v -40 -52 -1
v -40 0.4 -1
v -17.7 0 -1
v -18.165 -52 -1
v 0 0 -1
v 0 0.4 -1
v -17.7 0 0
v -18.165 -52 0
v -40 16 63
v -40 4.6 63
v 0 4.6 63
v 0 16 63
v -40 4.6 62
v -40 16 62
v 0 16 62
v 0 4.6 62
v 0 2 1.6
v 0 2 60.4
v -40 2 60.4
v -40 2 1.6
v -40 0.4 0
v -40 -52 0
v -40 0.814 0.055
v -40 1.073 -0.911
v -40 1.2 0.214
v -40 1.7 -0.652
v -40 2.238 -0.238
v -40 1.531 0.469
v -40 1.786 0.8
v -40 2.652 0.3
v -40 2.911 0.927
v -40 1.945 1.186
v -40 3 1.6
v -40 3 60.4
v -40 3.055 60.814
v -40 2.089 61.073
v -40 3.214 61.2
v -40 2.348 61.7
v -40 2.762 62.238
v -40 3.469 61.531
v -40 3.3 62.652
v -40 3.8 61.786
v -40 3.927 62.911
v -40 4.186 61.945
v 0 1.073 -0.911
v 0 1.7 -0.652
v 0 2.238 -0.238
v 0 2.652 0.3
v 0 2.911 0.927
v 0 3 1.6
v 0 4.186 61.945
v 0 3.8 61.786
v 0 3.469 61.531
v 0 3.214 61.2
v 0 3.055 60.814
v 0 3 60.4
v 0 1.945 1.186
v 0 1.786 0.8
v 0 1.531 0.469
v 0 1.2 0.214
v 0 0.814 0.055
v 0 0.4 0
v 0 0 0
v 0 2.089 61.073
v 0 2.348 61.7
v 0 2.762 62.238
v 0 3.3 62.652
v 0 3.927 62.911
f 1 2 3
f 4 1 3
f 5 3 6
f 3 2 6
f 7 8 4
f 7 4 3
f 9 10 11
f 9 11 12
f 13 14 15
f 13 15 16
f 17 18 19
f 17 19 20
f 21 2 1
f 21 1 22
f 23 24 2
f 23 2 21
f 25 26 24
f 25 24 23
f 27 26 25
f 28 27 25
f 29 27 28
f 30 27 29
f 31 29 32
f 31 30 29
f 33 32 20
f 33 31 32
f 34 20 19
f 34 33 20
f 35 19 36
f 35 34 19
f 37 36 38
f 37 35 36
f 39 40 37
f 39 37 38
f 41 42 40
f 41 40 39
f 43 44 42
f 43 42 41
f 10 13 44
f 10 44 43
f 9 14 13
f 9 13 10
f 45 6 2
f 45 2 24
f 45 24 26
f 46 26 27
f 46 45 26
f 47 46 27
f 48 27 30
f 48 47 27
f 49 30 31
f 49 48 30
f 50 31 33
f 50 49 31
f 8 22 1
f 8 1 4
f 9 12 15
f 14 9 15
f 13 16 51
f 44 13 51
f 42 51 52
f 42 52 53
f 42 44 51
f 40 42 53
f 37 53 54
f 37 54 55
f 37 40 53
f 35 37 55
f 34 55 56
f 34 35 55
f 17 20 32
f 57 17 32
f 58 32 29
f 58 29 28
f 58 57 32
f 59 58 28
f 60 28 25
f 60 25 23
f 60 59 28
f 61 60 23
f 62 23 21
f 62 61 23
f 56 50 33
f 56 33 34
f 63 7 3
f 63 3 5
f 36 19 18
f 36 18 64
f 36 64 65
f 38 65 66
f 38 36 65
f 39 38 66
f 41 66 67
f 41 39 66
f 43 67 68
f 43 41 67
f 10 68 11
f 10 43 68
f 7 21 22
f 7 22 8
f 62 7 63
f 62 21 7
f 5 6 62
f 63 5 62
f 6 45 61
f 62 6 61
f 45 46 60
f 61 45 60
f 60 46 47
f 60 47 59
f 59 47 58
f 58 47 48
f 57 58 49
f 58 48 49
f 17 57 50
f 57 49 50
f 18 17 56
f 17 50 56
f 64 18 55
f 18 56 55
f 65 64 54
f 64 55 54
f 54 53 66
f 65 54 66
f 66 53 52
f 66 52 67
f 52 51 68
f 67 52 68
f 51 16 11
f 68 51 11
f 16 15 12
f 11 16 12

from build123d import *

# Parameters (mm, degrees)
BASE_FLANGE1_DEPTH           = 1
EDGE_FLANGE1_STRIP_W         = 7.2
EDGE_FLANGE1_STRIP_H         = 1
EDGE_FLANGE1_STRIP_CUT_DEPTH = 40
EDGE_FLANGE1_DEPTH           = 40
EDGE_FLANGE2_STRIP_W         = 7.2
EDGE_FLANGE2_STRIP_H         = 1
EDGE_FLANGE2_STRIP_CUT_DEPTH = 40
EDGE_FLANGE2_DEPTH           = 40


# Sheet-metal steps are written as plain solids
with BuildPart() as part:
    # Sketch1 → Base-Flange1 (new body)
    with BuildSketch(Plane.XY):
        Polygon((0, 0), (0, 3), (-40, 3), (-40, -52), (-18.16511543, -52), (-17.7, 0), align=None)
    extrude(amount=-BASE_FLANGE1_DEPTH)

    # Edge-Flange1 strip (across the edge) → Edge-Flange1 strip cut (cut)
    with BuildSketch(Plane(origin=(0, 3, 0), x_dir=(0, -1, 0), z_dir=(-1, 0, 0))):
        with Locations((-1, -0.5)):
            Rectangle(EDGE_FLANGE1_STRIP_W, EDGE_FLANGE1_STRIP_H)
    extrude(amount=EDGE_FLANGE1_STRIP_CUT_DEPTH, mode=Mode.SUBTRACT)

    # Edge-Flange1 section (across the edge) → Edge-Flange1 (add)
    with BuildSketch(Plane(origin=(0, 3, 0), x_dir=(0, -1, 0), z_dir=(-1, 0, 0))):
        with BuildLine():
            Line((0, 1.6), (0, 63))
            Line((0, 63), (1, 63))
            Line((1, 63), (1, 1.6))
            ThreePointArc((1, 1.6), (1.46862915, 0.46862915), (2.6, 0))
            Line((2.6, 0), (2.6, -1))
            ThreePointArc((2.6, -1), (0.761522369, -0.238477631), (0, 1.6))
        make_face()
    extrude(amount=EDGE_FLANGE1_DEPTH)

    # Edge-Flange2 strip (across the edge) → Edge-Flange2 strip cut (cut)
    with BuildSketch(Plane(origin=(-40, 3, 63), x_dir=(0, 0, -1), z_dir=(1, 0, 0))):
        with Locations((-1, -0.5)):
            Rectangle(EDGE_FLANGE2_STRIP_W, EDGE_FLANGE2_STRIP_H)
    extrude(amount=EDGE_FLANGE2_STRIP_CUT_DEPTH, mode=Mode.SUBTRACT)

    # Edge-Flange2 section (across the edge) → Edge-Flange2 (add)
    with BuildSketch(Plane(origin=(-40, 3, 63), x_dir=(0, 0, -1), z_dir=(1, 0, 0))):
        with BuildLine():
            Line((0, 1.6), (0, 13))
            Line((0, 13), (1, 13))
            Line((1, 13), (1, 1.6))
            ThreePointArc((1, 1.6), (1.46862915, 0.46862915), (2.6, 0))
            Line((2.6, 0), (2.6, -1))
            ThreePointArc((2.6, -1), (0.761522369, -0.238477631), (0, 1.6))
        make_face()
    extrude(amount=EDGE_FLANGE2_DEPTH)


solid = part.part
